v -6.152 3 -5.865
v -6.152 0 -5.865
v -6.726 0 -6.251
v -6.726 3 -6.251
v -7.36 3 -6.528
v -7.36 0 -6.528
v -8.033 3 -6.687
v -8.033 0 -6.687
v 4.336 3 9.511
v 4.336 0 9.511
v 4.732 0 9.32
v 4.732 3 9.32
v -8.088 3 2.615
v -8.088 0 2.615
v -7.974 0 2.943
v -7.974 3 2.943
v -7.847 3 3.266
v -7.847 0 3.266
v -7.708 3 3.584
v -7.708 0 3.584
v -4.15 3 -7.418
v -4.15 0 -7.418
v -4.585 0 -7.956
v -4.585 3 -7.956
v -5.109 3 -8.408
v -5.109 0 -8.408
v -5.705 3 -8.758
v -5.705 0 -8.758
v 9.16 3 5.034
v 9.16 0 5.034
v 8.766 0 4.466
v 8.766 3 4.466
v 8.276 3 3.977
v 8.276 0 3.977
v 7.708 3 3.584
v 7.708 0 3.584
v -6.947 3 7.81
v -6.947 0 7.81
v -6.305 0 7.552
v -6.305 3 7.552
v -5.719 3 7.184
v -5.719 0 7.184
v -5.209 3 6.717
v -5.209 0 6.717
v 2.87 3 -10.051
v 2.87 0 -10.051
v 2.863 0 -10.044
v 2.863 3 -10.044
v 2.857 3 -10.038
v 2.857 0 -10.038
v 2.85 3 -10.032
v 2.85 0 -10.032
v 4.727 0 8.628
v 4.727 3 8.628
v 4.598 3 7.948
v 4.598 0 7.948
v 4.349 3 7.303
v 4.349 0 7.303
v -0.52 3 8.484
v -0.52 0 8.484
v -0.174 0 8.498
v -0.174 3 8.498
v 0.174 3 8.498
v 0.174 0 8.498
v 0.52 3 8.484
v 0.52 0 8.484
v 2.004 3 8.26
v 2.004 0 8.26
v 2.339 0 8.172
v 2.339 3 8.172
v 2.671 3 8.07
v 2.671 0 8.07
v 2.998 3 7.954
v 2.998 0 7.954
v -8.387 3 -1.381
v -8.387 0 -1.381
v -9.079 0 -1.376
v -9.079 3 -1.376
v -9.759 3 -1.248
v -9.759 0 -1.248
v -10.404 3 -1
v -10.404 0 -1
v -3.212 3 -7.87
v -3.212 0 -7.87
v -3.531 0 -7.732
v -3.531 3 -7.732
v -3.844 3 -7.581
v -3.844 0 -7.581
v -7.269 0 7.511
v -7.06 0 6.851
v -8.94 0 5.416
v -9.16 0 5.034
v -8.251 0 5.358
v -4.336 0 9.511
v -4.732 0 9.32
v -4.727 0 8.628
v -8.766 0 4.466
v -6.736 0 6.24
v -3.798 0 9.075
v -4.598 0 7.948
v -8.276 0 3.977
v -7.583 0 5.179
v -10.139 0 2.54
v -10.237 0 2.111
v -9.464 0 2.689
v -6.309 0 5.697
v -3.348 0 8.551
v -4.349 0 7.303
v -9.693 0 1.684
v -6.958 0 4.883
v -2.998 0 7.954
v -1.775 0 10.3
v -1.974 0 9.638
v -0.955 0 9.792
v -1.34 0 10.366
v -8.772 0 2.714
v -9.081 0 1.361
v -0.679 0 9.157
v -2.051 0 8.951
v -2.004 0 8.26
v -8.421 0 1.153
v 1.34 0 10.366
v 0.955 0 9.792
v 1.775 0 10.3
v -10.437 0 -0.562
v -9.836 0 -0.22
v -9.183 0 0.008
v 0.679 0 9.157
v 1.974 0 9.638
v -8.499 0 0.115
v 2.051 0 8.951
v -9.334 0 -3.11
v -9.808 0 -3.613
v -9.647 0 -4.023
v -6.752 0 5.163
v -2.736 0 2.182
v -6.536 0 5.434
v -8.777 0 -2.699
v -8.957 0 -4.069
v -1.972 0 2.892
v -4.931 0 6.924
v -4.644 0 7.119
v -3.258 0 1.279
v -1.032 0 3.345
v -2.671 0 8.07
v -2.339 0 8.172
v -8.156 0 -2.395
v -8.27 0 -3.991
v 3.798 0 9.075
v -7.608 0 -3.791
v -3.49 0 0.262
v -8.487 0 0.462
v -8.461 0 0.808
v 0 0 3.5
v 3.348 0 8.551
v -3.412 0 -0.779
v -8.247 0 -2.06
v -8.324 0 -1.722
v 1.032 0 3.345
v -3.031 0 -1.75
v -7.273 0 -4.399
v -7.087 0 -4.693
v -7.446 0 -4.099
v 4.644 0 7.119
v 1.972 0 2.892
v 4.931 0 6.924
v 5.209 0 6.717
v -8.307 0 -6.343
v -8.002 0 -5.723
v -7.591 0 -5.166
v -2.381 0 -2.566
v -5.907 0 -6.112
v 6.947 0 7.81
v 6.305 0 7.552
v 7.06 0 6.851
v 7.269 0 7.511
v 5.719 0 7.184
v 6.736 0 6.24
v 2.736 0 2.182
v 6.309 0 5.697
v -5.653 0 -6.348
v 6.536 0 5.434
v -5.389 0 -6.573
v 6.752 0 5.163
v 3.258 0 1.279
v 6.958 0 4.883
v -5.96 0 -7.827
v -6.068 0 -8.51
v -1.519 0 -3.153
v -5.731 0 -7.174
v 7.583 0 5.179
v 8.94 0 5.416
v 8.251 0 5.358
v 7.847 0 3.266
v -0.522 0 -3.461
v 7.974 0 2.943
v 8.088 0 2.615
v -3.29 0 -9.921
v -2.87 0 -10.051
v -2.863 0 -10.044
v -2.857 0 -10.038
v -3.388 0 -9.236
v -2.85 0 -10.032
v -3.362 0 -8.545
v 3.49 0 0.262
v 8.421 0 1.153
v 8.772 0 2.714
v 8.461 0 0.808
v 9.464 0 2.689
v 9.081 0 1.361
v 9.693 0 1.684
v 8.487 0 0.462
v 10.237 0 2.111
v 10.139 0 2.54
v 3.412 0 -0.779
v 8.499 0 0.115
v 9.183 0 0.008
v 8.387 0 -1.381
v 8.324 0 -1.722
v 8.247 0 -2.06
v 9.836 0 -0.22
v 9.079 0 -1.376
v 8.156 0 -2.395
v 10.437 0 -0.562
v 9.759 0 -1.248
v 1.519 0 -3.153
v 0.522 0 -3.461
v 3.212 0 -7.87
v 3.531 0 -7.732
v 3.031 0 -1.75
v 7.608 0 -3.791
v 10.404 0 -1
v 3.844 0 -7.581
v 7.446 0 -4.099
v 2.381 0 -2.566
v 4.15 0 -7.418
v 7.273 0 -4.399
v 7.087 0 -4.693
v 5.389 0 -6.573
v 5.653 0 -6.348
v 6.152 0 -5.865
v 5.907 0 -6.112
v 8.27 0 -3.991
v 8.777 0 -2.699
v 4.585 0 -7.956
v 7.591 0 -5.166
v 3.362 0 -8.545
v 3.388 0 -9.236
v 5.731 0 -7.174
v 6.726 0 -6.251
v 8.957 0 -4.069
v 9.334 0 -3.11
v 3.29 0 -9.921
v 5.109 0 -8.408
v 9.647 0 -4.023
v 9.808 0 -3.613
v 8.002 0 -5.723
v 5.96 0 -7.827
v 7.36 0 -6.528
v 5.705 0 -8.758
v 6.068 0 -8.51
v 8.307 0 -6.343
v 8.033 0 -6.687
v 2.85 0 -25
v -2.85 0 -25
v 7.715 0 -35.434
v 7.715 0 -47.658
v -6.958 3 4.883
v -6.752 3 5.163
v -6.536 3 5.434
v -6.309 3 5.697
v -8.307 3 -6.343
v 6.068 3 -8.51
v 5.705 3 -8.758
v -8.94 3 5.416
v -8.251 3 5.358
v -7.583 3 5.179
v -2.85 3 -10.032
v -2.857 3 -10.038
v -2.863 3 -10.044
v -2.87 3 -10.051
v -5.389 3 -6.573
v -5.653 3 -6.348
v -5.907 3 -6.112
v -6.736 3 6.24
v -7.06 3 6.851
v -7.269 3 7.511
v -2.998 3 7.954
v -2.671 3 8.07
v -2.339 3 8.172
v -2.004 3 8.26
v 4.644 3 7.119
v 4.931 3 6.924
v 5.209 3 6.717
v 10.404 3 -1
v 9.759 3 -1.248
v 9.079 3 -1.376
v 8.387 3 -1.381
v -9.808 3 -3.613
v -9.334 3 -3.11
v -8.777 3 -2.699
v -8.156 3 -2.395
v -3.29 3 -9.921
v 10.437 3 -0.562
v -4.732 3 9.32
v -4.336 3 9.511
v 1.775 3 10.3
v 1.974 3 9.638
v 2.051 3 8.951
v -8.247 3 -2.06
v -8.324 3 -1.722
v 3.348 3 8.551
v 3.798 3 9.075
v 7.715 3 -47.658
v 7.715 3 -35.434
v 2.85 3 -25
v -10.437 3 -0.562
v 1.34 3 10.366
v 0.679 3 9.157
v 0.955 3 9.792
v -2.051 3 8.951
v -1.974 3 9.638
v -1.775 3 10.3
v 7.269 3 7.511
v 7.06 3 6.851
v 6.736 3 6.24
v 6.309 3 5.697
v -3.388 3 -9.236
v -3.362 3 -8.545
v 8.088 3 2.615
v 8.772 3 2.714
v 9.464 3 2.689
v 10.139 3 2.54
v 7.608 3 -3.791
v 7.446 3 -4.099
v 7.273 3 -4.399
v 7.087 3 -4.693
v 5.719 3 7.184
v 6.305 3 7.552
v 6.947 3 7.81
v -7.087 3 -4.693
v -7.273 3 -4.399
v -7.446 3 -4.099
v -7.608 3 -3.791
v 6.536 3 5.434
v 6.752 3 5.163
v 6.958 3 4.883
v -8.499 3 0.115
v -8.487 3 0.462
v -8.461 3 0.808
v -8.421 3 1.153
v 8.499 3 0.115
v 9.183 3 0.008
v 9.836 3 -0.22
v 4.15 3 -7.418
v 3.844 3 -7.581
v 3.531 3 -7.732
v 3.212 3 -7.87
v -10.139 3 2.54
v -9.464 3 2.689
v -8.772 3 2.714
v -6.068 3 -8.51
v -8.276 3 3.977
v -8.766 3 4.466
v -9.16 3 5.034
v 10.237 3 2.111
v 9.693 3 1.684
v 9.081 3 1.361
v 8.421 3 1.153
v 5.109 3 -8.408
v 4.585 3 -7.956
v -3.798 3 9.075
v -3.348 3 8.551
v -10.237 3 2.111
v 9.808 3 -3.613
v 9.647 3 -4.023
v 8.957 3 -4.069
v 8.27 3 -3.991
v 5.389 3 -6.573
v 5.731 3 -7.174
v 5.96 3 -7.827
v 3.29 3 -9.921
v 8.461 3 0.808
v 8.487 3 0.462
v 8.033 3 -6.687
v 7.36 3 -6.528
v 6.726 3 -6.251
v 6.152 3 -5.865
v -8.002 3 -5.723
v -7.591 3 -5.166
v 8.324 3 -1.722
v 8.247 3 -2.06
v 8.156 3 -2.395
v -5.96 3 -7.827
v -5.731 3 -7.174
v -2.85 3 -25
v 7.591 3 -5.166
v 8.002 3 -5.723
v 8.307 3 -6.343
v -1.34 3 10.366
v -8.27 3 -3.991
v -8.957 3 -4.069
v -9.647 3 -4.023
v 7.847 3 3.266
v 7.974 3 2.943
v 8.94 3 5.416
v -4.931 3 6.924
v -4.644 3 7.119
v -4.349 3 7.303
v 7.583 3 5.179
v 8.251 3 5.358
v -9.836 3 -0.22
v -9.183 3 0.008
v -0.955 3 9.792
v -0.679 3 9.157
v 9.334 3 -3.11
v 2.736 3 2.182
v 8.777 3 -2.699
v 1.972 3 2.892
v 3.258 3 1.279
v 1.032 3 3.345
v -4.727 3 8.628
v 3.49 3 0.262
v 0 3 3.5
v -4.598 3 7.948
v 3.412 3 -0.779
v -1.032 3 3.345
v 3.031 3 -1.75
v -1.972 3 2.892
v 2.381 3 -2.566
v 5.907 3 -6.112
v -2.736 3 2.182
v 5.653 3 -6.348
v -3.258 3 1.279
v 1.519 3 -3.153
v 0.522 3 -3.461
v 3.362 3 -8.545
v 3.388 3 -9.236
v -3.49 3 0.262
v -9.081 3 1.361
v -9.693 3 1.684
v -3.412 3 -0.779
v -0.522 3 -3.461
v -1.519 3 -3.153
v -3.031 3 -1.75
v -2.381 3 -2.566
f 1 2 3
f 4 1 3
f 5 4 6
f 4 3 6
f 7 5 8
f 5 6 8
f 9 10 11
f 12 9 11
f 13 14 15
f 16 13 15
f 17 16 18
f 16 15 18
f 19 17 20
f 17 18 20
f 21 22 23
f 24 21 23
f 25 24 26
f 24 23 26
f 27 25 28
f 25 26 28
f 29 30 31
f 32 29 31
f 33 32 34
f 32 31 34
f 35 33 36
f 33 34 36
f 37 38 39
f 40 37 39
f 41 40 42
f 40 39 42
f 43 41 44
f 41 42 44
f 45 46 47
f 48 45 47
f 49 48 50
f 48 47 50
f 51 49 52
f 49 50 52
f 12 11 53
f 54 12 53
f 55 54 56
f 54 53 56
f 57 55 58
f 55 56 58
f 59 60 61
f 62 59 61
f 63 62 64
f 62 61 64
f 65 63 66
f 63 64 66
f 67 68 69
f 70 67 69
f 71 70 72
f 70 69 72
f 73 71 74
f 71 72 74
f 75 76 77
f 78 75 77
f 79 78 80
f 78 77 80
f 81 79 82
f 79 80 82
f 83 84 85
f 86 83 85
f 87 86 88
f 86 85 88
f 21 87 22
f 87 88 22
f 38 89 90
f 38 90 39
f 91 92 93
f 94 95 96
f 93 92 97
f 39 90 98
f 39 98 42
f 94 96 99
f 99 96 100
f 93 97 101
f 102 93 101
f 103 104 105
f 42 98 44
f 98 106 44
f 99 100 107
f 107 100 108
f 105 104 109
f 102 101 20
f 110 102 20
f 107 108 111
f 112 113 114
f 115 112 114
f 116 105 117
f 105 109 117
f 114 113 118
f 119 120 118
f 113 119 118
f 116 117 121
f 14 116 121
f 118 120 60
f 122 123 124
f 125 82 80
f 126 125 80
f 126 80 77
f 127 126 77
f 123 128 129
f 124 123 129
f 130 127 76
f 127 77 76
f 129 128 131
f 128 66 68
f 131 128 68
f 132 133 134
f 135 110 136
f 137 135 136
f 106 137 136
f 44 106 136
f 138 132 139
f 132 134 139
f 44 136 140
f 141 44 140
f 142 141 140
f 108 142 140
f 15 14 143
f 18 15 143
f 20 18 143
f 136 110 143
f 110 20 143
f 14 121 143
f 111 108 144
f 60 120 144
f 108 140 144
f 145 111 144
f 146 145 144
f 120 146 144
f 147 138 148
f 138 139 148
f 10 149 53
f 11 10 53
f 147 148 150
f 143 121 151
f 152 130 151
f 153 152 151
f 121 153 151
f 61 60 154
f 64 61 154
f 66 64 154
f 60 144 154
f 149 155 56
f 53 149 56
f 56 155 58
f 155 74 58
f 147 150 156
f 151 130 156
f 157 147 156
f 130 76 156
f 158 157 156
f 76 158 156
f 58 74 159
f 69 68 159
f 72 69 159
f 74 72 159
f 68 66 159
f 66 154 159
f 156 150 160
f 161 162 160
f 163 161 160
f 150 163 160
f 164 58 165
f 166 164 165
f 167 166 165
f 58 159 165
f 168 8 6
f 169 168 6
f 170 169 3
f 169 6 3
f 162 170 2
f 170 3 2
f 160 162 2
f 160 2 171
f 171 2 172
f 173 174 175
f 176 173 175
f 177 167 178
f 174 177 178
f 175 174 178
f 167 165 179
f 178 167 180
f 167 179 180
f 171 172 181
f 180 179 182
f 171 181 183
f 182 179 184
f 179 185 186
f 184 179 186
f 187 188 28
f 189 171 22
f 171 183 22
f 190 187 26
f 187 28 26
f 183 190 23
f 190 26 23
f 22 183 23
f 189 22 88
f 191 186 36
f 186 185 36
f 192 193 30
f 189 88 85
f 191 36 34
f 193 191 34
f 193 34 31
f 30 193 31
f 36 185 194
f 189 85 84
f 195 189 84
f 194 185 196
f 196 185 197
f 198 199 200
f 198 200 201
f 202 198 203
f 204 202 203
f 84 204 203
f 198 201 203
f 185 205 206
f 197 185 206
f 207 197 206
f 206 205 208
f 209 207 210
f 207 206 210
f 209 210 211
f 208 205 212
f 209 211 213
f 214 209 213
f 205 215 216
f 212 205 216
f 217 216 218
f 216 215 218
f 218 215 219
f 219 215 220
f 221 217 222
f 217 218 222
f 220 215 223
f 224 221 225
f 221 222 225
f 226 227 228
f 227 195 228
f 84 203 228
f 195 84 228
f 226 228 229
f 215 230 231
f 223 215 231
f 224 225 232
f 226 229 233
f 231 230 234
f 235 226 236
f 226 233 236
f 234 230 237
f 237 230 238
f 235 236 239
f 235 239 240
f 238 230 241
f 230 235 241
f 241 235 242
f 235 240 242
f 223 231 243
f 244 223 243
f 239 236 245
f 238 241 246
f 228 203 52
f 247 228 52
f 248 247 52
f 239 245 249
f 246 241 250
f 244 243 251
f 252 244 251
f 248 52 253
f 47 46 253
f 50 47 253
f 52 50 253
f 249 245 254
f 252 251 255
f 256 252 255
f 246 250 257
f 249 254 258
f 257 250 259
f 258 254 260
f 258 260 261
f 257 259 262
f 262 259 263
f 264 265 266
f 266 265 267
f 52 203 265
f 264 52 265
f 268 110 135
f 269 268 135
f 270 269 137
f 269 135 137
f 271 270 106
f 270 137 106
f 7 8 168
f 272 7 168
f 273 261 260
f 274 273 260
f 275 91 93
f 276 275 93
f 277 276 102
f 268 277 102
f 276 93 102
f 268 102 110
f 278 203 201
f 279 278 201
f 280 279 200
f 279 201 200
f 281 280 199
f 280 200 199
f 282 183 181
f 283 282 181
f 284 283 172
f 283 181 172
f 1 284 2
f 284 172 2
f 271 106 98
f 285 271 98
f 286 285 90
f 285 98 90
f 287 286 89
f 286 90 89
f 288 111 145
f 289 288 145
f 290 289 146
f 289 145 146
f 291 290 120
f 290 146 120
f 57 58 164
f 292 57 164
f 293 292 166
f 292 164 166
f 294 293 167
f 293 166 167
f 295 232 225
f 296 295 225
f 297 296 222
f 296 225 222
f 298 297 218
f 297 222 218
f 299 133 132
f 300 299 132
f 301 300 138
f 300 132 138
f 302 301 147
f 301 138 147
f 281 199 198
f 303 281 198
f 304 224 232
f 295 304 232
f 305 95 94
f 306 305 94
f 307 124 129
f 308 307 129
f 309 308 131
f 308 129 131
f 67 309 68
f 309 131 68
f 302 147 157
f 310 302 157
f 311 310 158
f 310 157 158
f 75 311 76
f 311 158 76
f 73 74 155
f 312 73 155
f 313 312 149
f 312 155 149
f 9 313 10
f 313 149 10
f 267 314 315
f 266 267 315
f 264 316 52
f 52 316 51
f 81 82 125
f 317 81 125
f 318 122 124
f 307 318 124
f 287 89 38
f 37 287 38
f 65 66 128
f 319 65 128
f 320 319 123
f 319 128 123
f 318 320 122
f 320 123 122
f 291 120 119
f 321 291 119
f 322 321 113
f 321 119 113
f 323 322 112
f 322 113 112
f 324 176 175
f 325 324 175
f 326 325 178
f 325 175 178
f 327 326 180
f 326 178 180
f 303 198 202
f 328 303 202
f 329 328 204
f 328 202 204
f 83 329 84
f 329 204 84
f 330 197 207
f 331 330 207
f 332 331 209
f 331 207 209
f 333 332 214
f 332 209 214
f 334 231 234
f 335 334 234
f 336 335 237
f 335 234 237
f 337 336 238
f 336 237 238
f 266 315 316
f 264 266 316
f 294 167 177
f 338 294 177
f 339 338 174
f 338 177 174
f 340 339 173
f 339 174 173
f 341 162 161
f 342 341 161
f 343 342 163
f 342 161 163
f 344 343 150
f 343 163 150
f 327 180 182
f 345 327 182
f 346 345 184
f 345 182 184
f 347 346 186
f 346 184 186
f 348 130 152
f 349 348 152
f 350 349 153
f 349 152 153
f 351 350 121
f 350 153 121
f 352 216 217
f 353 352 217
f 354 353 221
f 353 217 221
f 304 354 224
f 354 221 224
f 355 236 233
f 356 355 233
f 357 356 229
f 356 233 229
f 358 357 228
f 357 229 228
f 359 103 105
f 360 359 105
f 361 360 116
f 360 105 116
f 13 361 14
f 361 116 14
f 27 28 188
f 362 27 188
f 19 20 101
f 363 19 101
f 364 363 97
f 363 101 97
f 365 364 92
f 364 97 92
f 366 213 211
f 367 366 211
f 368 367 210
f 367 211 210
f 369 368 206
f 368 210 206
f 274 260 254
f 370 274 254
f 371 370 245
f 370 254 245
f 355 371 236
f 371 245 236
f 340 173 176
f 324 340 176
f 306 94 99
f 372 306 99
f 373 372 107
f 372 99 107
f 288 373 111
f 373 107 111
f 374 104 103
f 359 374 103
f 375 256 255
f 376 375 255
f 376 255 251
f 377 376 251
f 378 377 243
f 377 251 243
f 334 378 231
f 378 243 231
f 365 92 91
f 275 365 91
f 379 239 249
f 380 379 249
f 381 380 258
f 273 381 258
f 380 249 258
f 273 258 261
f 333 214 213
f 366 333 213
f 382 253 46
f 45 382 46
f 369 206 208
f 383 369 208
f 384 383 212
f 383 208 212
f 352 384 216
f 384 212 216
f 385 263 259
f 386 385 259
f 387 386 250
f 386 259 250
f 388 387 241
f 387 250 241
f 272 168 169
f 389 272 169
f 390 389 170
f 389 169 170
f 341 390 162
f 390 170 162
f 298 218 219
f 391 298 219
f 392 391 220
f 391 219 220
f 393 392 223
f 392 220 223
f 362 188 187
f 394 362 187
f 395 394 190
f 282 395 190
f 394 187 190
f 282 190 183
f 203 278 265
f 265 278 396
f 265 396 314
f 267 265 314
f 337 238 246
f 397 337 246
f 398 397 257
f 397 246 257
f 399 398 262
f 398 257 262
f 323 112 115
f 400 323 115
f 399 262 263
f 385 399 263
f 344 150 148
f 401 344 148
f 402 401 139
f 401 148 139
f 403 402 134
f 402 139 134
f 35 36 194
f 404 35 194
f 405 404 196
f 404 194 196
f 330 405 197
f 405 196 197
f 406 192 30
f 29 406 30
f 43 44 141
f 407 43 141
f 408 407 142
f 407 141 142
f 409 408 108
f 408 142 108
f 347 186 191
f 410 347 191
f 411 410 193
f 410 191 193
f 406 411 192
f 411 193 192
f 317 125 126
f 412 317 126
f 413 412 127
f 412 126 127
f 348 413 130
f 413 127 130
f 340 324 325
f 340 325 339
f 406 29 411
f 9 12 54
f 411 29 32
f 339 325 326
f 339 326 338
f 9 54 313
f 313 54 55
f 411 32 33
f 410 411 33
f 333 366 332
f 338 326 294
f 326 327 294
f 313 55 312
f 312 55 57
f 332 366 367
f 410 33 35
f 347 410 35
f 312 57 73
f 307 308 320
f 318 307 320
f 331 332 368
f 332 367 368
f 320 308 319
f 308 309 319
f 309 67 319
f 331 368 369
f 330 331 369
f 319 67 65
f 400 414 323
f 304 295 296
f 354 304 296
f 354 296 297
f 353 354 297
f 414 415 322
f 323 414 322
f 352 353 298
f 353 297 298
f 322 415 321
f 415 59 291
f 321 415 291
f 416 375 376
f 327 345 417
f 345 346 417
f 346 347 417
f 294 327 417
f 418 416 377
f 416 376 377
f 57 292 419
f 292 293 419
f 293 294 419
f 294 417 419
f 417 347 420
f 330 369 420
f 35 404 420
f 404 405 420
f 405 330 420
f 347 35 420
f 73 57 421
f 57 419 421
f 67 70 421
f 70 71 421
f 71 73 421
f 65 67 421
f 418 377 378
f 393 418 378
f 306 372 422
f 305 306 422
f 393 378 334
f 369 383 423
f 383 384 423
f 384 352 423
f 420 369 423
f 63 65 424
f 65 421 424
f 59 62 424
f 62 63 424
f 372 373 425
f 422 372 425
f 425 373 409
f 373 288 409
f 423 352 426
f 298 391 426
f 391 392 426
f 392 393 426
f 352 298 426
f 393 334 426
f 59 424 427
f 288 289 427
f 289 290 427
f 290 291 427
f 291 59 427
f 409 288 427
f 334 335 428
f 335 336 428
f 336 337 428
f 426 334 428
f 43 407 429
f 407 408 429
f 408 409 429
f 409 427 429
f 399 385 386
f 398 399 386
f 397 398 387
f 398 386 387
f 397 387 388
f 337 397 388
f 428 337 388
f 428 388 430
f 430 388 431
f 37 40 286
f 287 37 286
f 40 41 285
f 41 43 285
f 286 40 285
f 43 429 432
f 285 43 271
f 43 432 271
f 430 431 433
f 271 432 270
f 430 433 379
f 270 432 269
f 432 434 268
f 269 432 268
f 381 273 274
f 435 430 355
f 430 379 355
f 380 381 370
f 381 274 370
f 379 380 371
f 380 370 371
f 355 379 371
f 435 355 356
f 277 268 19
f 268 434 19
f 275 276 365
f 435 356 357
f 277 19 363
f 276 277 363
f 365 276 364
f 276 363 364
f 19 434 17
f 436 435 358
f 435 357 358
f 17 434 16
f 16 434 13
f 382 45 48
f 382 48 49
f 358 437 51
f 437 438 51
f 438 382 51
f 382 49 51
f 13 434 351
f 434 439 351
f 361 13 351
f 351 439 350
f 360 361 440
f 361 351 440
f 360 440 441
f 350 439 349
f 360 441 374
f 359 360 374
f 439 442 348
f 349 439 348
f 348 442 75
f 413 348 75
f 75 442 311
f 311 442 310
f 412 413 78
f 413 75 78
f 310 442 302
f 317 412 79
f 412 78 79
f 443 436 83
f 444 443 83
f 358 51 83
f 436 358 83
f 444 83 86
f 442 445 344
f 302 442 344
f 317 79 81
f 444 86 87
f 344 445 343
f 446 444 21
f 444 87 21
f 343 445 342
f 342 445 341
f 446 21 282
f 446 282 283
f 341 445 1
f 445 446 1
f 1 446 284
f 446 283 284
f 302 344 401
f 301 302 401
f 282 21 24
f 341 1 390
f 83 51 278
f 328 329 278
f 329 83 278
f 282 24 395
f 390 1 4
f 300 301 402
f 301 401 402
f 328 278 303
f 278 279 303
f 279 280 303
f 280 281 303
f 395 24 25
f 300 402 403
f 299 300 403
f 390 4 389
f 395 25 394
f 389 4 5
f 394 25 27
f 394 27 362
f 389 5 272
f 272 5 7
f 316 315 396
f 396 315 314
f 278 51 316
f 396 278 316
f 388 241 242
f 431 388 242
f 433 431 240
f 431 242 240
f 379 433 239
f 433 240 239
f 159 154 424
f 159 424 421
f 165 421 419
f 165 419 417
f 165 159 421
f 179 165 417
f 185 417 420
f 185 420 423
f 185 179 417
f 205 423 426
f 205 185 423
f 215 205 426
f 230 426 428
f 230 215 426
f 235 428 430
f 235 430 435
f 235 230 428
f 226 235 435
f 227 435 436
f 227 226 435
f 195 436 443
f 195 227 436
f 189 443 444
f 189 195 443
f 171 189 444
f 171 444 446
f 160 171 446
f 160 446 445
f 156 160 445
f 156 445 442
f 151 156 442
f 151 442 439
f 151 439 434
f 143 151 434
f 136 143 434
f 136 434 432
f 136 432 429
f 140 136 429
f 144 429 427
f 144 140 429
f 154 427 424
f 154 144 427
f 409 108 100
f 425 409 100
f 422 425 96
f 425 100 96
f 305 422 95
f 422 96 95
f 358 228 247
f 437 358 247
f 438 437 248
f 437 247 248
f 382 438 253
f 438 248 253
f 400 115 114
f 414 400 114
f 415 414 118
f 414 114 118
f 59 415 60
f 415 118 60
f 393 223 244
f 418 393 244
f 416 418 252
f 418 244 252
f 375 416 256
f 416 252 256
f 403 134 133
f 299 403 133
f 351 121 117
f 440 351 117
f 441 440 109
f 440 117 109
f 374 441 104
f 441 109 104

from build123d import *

# Parameters (mm, degrees)
SKETCH1_R           = 3.5
BOSS_EXTRUDE1_DEPTH = 3
BOSS_EXTRUDE2_DEPTH = 3


with BuildPart() as part:
    # Sketch1 → Boss-Extrude1 (new body)
    with BuildSketch(Plane(origin=(0, 0, 0), x_dir=(1, 0, 0), z_dir=(0, 1, 0))):
        with BuildLine():
            Line((0.22, 10.45), (-0.22, 10.45))
            ThreePointArc((-0.22, 10.45), (-0.619608599, 9.494397866), (-0.75, 8.466847111))
            ThreePointArc((-0.75, 8.466847111), (-1.266859262, 8.405062023), (-1.778967393, 8.311755231))
            ThreePointArc((-1.778967393, 8.311755231), (-2.206441771, 9.255221249), (-2.869965555, 10.050581959))
            Line((-2.869965555, 10.050581959), (-3.29041759, 9.920889682))
            ThreePointArc((-3.29041759, 9.920889682), (-3.390604026, 8.889955567), (-3.212326601, 7.869622469))
            ThreePointArc((-3.212326601, 7.869622469), (-3.688011782, 7.658235377), (-4.149865725, 7.418127423))
            ThreePointArc((-4.149865725, 7.418127423), (-4.836440108, 8.193677608), (-5.704922076, 8.758125604))
            Line((-5.704922076, 8.758125604), (-6.068467137, 8.510264779))
            ThreePointArc((-6.068467137, 8.510264779), (-5.860329406, 7.495601704), (-5.389223887, 6.573147336))
            ThreePointArc((-5.389223887, 6.573147336), (-5.781468271, 6.230940911), (-6.152030277, 5.865366439))
            ThreePointArc((-6.152030277, 5.865366439), (-7.036699516, 6.404089754), (-8.032971235, 6.687471356))
            Line((-8.032971235, 6.687471356), (-8.307306748, 6.343465503))
            ThreePointArc((-8.307306748, 6.343465503), (-7.809338801, 5.435230735), (-7.08726498, 4.692619216))
            ThreePointArc((-7.08726498, 4.692619216), (-7.361215932, 4.25), (-7.607559941, 3.791441908))
            ThreePointArc((-7.607559941, 3.791441908), (-8.611717292, 4.045470421), (-9.647255648, 4.022605929))
            Line((-9.647255648, 4.022605929), (-9.808005699, 3.61302148))
            ThreePointArc((-9.808005699, 3.61302148), (-9.064454173, 2.891915663), (-8.155571478, 2.395131285))
            ThreePointArc((-8.155571478, 2.395131285), (-8.286887254, 1.891427939), (-8.387124519, 1.380631125))
            ThreePointArc((-8.387124519, 1.380631125), (-9.421546195, 1.327393289), (-10.40433906, 1.000314313))
            Line((-10.40433906, 1.000314313), (-10.437220301, 0.561544643))
            ThreePointArc((-10.437220301, 0.561544643), (-9.514153012, 0.091641193), (-8.499219659, -0.115174571))
            ThreePointArc((-8.499219659, -0.115174571), (-8.476232276, -0.635205795), (-8.421456277, -1.152854793))
            ThreePointArc((-8.421456277, -1.152854793), (-9.394229373, -1.508628563), (-10.236951288, -2.110859619))
            Line((-10.236951288, -2.110859619), (-10.139042077, -2.539827901))
            ThreePointArc((-10.139042077, -2.539827901), (-9.118477605, -2.716775998), (-8.087674876, -2.615246661))
            ThreePointArc((-8.087674876, -2.615246661), (-7.912426863, -3.105398707), (-7.707504688, -3.583904503))
            ThreePointArc((-7.707504688, -3.583904503), (-8.532194045, -4.210602146), (-9.15996547, -5.034474411))
            Line((-9.15996547, -5.034474411), (-8.93996547, -5.415525589))
            ThreePointArc((-8.93996547, -5.415525589), (-7.912585446, -5.28379572), (-6.957504688, -4.882942608))
            ThreePointArc((-6.957504688, -4.882942608), (-6.645567601, -5.299663316), (-6.308707484, -5.69650857))
            ThreePointArc((-6.308707484, -5.69650857), (-6.912035833, -6.53844525), (-7.269076522, -7.510754058))
            Line((-7.269076522, -7.510754058), (-6.946533698, -7.810030063))
            ThreePointArc((-6.946533698, -7.810030063), (-6.003625347, -7.381327005), (-5.209129676, -6.716767676))
            ThreePointArc((-5.209129676, -6.716767676), (-4.788220494, -7.023029582), (-4.349353934, -7.302952852))
            ThreePointArc((-4.349353934, -7.302952852), (-4.677712905, -8.285318801), (-4.732298225, -9.319670247))
            Line((-4.732298225, -9.319670247), (-4.335871923, -9.510579092))
            ThreePointArc((-4.335871923, -9.510579092), (-3.561216789, -8.822994992), (-2.997900632, -7.953778461))
            ThreePointArc((-2.997900632, -7.953778461), (-2.505418982, -8.122368849), (-2.0035412, -8.260497725))
            ThreePointArc((-2.0035412, -8.260497725), (-2.027754657, -9.296005416), (-1.775034463, -10.300492835))
            Line((-1.775034463, -10.300492835), (-1.3399489, -10.366071433))
            ThreePointArc((-1.3399489, -10.366071433), (-0.802378491, -9.480701156), (-0.520294961, -8.484061124))
            ThreePointArc((-0.520294961, -8.484061124), (0, -8.5), (0.520294961, -8.484061124))
            ThreePointArc((0.520294961, -8.484061124), (0.802378491, -9.480701156), (1.3399489, -10.366071433))
            Line((1.3399489, -10.366071433), (1.775034463, -10.300492835))
            ThreePointArc((1.775034463, -10.300492835), (2.027754657, -9.296005416), (2.0035412, -8.260497725))
            ThreePointArc((2.0035412, -8.260497725), (2.505418982, -8.122368849), (2.997900632, -7.953778461))
            ThreePointArc((2.997900632, -7.953778461), (3.561216789, -8.822994992), (4.335871923, -9.510579092))
            Line((4.335871923, -9.510579092), (4.732298225, -9.319670247))
            ThreePointArc((4.732298225, -9.319670247), (4.677712905, -8.285318801), (4.349353934, -7.302952852))
            ThreePointArc((4.349353934, -7.302952852), (4.788220494, -7.023029582), (5.209129676, -6.716767676))
            ThreePointArc((5.209129676, -6.716767676), (6.003625347, -7.381327005), (6.946533698, -7.810030063))
            Line((6.946533698, -7.810030063), (7.269076522, -7.510754058))
            ThreePointArc((7.269076522, -7.510754058), (6.912035833, -6.53844525), (6.308707484, -5.69650857))
            ThreePointArc((6.308707484, -5.69650857), (6.645567601, -5.299663316), (6.957504688, -4.882942608))
            ThreePointArc((6.957504688, -4.882942608), (7.912585446, -5.28379572), (8.93996547, -5.415525589))
            Line((8.93996547, -5.415525589), (9.15996547, -5.034474411))
            ThreePointArc((9.15996547, -5.034474411), (8.532194045, -4.210602146), (7.707504688, -3.583904503))
            ThreePointArc((7.707504688, -3.583904503), (7.912426863, -3.105398707), (8.087674876, -2.615246661))
            ThreePointArc((8.087674876, -2.615246661), (9.118477605, -2.716775998), (10.139042077, -2.539827901))
            Line((10.139042077, -2.539827901), (10.236951288, -2.110859619))
            ThreePointArc((10.236951288, -2.110859619), (9.394229373, -1.508628563), (8.421456277, -1.152854793))
            ThreePointArc((8.421456277, -1.152854793), (8.476232276, -0.635205795), (8.499219659, -0.115174571))
            ThreePointArc((8.499219659, -0.115174571), (9.514153012, 0.091641193), (10.437220301, 0.561544643))
            Line((10.437220301, 0.561544643), (10.40433906, 1.000314313))
            ThreePointArc((10.40433906, 1.000314313), (9.421546195, 1.327393289), (8.387124519, 1.380631125))
            ThreePointArc((8.387124519, 1.380631125), (8.286887254, 1.891427939), (8.155571478, 2.395131285))
            ThreePointArc((8.155571478, 2.395131285), (9.064454173, 2.891915663), (9.808005699, 3.61302148))
            Line((9.808005699, 3.61302148), (9.647255648, 4.022605929))
            ThreePointArc((9.647255648, 4.022605929), (8.611717292, 4.045470421), (7.607559941, 3.791441908))
            ThreePointArc((7.607559941, 3.791441908), (7.361215932, 4.25), (7.08726498, 4.692619216))
            ThreePointArc((7.08726498, 4.692619216), (7.809338801, 5.435230735), (8.307306748, 6.343465503))
            Line((8.307306748, 6.343465503), (8.032971235, 6.687471356))
            ThreePointArc((8.032971235, 6.687471356), (7.036699516, 6.404089754), (6.152030277, 5.865366439))
            ThreePointArc((6.152030277, 5.865366439), (5.781468271, 6.230940911), (5.389223887, 6.573147336))
            ThreePointArc((5.389223887, 6.573147336), (5.860329406, 7.495601704), (6.068467137, 8.510264779))
            Line((6.068467137, 8.510264779), (5.704922076, 8.758125604))
            ThreePointArc((5.704922076, 8.758125604), (4.836440108, 8.193677608), (4.149865725, 7.418127423))
            ThreePointArc((4.149865725, 7.418127423), (3.688011782, 7.658235377), (3.212326601, 7.869622469))
            ThreePointArc((3.212326601, 7.869622469), (3.390604026, 8.889955567), (3.29041759, 9.920889682))
            Line((3.29041759, 9.920889682), (2.869965555, 10.050581959))
            ThreePointArc((2.869965555, 10.050581959), (2.206441771, 9.255221249), (1.778967393, 8.311755231))
            ThreePointArc((1.778967393, 8.311755231), (1.266859262, 8.405062023), (0.75, 8.466847111))
            ThreePointArc((0.75, 8.466847111), (0.619608599, 9.494397866), (0.22, 10.45))
        make_face()
        with Locations(Location((0, 0, 0), (0, 0, 270))):
            Circle(SKETCH1_R, mode=Mode.SUBTRACT)
    extrude(amount=BOSS_EXTRUDE1_DEPTH)

    # Sketch4 → Boss-Extrude2 (add)
    with BuildSketch(Plane(origin=(0, 3, 0), x_dir=(1, 0, 0), z_dir=(0, 1, 0))):
        Polygon((-2.85, 4.257844413), (-2.85, 25), (7.715456544, 47.657694676), (7.715456544, 35.434005229), (2.85, 25), (2.85, 4.257844413), align=None)
    extrude(amount=-BOSS_EXTRUDE2_DEPTH)


solid = part.part
